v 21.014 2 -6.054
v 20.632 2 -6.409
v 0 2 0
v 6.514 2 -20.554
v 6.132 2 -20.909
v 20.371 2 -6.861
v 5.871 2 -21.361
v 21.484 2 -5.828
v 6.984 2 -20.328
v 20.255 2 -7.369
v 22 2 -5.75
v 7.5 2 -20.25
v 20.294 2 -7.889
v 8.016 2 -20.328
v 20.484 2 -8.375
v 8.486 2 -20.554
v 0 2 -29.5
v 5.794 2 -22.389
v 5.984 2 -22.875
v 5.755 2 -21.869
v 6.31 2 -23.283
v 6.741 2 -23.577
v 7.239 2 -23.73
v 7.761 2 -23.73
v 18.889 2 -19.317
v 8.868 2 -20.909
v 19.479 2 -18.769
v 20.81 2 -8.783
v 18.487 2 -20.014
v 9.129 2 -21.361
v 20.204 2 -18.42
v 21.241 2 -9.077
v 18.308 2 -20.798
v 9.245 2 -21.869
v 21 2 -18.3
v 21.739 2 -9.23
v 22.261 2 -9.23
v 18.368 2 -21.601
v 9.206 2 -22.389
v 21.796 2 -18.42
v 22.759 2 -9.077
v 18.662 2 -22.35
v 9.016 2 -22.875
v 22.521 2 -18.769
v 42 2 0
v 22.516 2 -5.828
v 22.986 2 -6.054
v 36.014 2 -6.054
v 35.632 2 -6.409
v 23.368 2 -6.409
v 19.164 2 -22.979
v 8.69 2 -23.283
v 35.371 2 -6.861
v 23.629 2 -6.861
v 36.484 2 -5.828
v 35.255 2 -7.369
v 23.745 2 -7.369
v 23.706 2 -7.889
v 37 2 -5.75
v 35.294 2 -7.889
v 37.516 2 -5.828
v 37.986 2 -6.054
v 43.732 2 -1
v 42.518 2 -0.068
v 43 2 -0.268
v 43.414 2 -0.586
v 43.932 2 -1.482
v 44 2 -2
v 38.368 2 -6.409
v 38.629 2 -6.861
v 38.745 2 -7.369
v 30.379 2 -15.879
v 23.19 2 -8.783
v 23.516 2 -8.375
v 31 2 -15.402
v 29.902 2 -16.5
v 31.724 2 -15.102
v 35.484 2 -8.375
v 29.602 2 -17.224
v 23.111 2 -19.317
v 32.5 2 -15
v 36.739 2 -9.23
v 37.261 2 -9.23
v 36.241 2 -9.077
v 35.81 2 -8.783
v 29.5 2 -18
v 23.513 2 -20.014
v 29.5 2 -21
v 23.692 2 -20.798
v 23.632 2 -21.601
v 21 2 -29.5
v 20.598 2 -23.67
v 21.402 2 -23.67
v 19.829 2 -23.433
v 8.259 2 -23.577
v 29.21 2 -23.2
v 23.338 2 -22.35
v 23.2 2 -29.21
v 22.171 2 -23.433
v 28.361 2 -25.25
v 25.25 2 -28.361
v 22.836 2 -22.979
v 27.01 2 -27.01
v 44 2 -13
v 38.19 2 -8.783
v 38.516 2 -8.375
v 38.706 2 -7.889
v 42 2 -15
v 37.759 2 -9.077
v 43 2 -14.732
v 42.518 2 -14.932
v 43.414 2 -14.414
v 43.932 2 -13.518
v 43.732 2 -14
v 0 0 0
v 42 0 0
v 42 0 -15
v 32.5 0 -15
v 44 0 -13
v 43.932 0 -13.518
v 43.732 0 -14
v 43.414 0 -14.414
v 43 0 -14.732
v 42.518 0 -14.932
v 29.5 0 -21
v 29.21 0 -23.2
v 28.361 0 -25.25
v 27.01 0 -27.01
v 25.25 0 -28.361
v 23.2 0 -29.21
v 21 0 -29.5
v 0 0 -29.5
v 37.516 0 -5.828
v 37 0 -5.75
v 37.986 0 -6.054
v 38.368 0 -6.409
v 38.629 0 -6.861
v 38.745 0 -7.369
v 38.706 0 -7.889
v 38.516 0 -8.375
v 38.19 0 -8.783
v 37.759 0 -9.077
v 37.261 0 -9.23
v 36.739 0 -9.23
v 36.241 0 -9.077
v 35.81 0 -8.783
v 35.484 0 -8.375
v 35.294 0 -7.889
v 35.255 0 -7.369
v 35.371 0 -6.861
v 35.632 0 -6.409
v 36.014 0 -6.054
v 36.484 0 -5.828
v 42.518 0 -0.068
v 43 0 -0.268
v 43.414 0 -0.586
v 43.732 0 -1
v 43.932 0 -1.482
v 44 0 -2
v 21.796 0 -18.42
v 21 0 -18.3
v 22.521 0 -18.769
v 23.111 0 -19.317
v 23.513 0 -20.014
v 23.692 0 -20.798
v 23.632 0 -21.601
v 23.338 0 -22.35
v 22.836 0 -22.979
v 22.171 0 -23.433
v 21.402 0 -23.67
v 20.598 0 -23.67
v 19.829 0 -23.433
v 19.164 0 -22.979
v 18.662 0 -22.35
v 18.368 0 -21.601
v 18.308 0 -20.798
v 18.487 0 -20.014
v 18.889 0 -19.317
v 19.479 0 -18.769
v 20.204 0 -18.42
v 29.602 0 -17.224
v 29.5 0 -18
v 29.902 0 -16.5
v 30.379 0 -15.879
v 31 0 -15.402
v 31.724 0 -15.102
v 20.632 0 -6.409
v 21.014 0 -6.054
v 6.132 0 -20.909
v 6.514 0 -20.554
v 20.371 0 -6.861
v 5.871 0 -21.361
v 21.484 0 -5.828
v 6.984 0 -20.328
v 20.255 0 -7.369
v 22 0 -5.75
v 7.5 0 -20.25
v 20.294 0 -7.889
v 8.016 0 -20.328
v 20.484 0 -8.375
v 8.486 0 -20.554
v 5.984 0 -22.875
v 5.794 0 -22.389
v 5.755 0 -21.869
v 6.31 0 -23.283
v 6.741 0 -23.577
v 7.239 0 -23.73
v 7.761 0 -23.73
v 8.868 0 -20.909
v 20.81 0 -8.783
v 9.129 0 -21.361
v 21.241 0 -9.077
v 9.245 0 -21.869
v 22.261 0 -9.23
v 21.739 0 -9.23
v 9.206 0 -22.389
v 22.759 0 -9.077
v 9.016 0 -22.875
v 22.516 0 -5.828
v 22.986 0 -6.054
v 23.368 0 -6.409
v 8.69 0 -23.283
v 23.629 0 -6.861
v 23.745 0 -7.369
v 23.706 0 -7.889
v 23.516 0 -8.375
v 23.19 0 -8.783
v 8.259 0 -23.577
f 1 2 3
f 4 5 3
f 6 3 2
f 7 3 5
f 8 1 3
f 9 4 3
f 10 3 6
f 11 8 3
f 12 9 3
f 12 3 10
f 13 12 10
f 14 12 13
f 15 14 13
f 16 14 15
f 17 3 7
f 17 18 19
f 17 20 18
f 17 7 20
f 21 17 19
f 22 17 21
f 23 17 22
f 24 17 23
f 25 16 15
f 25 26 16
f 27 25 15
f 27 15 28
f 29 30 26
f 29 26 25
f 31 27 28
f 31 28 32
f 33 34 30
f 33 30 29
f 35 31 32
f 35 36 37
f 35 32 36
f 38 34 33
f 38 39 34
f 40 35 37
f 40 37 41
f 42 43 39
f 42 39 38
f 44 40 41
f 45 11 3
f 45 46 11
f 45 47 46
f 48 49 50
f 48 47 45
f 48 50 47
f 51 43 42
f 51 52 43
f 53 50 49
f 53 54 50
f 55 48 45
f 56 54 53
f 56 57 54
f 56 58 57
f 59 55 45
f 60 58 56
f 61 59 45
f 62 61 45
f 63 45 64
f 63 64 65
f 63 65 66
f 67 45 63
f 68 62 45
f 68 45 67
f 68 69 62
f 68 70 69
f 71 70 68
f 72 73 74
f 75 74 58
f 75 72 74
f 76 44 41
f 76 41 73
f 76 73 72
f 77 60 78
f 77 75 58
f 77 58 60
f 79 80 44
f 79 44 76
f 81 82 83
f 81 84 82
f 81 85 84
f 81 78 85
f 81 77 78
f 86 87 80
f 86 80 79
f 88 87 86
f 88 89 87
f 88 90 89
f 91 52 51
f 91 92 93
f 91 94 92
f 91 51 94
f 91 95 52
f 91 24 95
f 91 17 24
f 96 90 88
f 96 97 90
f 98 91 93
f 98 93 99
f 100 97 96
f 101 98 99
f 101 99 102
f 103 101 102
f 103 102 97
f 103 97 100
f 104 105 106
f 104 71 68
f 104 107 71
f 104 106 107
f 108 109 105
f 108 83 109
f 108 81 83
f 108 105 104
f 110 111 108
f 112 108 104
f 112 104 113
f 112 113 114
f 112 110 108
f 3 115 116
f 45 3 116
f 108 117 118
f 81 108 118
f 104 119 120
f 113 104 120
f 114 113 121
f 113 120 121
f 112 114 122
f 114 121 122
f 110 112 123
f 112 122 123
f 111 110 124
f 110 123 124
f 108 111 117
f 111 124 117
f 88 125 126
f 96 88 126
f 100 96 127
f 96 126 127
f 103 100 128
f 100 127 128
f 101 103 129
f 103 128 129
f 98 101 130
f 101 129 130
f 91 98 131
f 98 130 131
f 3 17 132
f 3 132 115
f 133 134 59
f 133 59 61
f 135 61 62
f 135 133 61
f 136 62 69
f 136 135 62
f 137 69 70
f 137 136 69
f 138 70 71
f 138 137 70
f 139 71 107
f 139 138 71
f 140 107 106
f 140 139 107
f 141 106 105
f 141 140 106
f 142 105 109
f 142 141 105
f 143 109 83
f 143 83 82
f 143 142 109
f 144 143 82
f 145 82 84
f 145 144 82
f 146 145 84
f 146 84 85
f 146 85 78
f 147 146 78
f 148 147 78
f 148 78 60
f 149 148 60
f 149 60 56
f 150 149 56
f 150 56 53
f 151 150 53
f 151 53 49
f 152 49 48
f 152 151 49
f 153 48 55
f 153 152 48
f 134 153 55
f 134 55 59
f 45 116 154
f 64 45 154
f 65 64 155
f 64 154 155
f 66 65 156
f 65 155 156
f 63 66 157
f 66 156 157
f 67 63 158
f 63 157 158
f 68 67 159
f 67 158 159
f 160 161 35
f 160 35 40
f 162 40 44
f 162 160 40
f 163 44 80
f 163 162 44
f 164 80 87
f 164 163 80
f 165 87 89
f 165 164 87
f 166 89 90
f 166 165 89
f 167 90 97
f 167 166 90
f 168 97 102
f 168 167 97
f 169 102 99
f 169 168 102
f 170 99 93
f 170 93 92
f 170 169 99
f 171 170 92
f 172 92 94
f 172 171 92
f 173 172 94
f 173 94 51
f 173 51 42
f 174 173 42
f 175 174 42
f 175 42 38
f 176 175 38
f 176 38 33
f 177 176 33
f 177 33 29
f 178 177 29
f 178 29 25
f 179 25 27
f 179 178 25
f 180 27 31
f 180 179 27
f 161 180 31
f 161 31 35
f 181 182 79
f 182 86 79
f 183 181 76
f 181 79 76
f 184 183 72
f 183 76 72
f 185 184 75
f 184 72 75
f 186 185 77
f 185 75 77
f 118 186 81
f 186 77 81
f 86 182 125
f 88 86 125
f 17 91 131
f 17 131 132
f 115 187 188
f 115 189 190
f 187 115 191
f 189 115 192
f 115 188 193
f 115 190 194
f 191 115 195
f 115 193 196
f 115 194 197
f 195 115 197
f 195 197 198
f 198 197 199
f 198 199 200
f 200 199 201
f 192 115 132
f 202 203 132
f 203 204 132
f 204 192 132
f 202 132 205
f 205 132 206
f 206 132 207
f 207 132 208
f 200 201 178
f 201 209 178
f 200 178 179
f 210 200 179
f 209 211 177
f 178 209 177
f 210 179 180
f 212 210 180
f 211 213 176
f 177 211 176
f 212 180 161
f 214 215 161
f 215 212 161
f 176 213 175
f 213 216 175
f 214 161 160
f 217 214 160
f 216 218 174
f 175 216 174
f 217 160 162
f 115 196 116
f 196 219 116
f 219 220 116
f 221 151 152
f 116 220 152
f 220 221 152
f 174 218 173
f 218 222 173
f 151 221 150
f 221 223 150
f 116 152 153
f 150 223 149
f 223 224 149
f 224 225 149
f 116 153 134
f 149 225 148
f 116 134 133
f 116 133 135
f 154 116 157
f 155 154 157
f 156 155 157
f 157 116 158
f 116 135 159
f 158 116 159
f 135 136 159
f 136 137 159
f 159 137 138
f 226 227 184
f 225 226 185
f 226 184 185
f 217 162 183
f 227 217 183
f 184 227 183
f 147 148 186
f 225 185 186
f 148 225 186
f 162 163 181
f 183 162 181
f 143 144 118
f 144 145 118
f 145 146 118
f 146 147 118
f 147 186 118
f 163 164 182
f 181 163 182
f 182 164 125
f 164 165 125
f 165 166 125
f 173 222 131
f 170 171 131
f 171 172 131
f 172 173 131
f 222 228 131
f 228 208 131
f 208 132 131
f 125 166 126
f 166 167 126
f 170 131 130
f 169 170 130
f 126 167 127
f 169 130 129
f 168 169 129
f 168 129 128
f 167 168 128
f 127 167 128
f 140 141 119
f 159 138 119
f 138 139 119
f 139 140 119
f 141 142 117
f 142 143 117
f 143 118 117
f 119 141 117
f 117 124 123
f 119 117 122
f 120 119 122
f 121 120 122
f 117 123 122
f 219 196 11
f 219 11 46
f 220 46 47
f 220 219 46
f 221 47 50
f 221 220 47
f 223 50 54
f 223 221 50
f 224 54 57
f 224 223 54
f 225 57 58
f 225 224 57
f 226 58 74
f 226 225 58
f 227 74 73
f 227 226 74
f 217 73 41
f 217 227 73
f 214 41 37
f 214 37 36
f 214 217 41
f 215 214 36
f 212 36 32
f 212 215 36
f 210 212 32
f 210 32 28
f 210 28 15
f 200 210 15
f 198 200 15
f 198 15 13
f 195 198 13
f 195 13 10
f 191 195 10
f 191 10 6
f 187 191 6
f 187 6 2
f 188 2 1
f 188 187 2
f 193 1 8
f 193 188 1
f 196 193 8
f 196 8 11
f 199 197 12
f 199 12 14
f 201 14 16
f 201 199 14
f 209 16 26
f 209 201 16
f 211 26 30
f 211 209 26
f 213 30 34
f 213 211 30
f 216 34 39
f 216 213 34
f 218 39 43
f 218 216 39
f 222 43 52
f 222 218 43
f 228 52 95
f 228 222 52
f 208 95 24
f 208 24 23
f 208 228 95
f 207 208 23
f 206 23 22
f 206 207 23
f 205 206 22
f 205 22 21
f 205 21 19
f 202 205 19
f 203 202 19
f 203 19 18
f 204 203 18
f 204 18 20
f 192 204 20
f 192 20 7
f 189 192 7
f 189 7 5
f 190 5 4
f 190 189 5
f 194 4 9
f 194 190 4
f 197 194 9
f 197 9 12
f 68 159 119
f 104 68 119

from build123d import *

# Parameters (mm, degrees)
SKETCH_1_R      = 1.75
SKETCH_1_R_2    = 5
EXTRUDE_1_DEPTH = 2
FILLET_1_R      = 3
EXTRUDE_START   = -2
SKETCH_2_R      = 5
SKETCH_2_R_2    = 2.7
EXTRUDE_2_DEPTH = 2
EXTRUDE_3_DEPTH = 2


with BuildPart() as part:
    # 草图1 → 凸台-拉伸1 (new body)
    with BuildSketch(Plane(origin=(0, 0, 0), x_dir=(1, 0, 0), z_dir=(0, 1, 0))):
        with BuildLine():
            Line((0, 27), (0, 0))
            Line((0, 0), (42, 0))
            ThreePointArc((42, 0), (43.414213562, 0.585786438), (44, 2))
            Line((44, 2), (44, 13))
            ThreePointArc((44, 13), (43.414213562, 14.414213562), (42, 15))
            Line((42, 15), (29.5, 15))
            Line((29.5, 15), (29.5, 21))
            ThreePointArc((29.5, 21), (27.01040764, 27.01040764), (21, 29.5))
            Line((21, 29.5), (0, 27))
        make_face()
        with Locations(Location((22, 7.5, 0), (0, 0, 270))):
            Circle(SKETCH_1_R, mode=Mode.SUBTRACT)
        with Locations(Location((37, 7.5, 0), (0, 0, 270))):
            Circle(SKETCH_1_R, mode=Mode.SUBTRACT)
        with Locations(Location((7.5, 22, 0), (0, 0, 270))):
            Circle(SKETCH_1_R, mode=Mode.SUBTRACT)
        with Locations(Location((21, 21, 0), (0, 0, 270))):
            Circle(SKETCH_1_R_2, mode=Mode.SUBTRACT)
    extrude(amount=EXTRUDE_1_DEPTH)

    # 圆角1
    fillet_1_edges = [part.edges().sort_by_distance(p)[0] for p in [
        (29.5, 1, -15),
    ]]
    fillet(fillet_1_edges, radius=FILLET_1_R)

    # 草图2 → 凸台-拉伸2 (add)
    with BuildSketch(Plane(origin=(0, 2, 0), x_dir=(1, 0, 0), z_dir=(0, 1, 0)).offset(EXTRUDE_START)):
        with Locations((21, 21)):
            Circle(SKETCH_2_R)
        with Locations(Location((21, 21, 0), (0, 0, 270))):
            Circle(SKETCH_2_R_2, mode=Mode.SUBTRACT)
    extrude(amount=EXTRUDE_2_DEPTH)

    # 草图3 → 凸台-拉伸3 (add)
    with BuildSketch(Plane(origin=(0, 2, 0), x_dir=(1, 0, 0), z_dir=(0, 1, 0))):
        Polygon((21, 29.5), (0, 29.5), (0, 27), align=None)
    extrude(amount=-EXTRUDE_3_DEPTH)


solid = part.part
